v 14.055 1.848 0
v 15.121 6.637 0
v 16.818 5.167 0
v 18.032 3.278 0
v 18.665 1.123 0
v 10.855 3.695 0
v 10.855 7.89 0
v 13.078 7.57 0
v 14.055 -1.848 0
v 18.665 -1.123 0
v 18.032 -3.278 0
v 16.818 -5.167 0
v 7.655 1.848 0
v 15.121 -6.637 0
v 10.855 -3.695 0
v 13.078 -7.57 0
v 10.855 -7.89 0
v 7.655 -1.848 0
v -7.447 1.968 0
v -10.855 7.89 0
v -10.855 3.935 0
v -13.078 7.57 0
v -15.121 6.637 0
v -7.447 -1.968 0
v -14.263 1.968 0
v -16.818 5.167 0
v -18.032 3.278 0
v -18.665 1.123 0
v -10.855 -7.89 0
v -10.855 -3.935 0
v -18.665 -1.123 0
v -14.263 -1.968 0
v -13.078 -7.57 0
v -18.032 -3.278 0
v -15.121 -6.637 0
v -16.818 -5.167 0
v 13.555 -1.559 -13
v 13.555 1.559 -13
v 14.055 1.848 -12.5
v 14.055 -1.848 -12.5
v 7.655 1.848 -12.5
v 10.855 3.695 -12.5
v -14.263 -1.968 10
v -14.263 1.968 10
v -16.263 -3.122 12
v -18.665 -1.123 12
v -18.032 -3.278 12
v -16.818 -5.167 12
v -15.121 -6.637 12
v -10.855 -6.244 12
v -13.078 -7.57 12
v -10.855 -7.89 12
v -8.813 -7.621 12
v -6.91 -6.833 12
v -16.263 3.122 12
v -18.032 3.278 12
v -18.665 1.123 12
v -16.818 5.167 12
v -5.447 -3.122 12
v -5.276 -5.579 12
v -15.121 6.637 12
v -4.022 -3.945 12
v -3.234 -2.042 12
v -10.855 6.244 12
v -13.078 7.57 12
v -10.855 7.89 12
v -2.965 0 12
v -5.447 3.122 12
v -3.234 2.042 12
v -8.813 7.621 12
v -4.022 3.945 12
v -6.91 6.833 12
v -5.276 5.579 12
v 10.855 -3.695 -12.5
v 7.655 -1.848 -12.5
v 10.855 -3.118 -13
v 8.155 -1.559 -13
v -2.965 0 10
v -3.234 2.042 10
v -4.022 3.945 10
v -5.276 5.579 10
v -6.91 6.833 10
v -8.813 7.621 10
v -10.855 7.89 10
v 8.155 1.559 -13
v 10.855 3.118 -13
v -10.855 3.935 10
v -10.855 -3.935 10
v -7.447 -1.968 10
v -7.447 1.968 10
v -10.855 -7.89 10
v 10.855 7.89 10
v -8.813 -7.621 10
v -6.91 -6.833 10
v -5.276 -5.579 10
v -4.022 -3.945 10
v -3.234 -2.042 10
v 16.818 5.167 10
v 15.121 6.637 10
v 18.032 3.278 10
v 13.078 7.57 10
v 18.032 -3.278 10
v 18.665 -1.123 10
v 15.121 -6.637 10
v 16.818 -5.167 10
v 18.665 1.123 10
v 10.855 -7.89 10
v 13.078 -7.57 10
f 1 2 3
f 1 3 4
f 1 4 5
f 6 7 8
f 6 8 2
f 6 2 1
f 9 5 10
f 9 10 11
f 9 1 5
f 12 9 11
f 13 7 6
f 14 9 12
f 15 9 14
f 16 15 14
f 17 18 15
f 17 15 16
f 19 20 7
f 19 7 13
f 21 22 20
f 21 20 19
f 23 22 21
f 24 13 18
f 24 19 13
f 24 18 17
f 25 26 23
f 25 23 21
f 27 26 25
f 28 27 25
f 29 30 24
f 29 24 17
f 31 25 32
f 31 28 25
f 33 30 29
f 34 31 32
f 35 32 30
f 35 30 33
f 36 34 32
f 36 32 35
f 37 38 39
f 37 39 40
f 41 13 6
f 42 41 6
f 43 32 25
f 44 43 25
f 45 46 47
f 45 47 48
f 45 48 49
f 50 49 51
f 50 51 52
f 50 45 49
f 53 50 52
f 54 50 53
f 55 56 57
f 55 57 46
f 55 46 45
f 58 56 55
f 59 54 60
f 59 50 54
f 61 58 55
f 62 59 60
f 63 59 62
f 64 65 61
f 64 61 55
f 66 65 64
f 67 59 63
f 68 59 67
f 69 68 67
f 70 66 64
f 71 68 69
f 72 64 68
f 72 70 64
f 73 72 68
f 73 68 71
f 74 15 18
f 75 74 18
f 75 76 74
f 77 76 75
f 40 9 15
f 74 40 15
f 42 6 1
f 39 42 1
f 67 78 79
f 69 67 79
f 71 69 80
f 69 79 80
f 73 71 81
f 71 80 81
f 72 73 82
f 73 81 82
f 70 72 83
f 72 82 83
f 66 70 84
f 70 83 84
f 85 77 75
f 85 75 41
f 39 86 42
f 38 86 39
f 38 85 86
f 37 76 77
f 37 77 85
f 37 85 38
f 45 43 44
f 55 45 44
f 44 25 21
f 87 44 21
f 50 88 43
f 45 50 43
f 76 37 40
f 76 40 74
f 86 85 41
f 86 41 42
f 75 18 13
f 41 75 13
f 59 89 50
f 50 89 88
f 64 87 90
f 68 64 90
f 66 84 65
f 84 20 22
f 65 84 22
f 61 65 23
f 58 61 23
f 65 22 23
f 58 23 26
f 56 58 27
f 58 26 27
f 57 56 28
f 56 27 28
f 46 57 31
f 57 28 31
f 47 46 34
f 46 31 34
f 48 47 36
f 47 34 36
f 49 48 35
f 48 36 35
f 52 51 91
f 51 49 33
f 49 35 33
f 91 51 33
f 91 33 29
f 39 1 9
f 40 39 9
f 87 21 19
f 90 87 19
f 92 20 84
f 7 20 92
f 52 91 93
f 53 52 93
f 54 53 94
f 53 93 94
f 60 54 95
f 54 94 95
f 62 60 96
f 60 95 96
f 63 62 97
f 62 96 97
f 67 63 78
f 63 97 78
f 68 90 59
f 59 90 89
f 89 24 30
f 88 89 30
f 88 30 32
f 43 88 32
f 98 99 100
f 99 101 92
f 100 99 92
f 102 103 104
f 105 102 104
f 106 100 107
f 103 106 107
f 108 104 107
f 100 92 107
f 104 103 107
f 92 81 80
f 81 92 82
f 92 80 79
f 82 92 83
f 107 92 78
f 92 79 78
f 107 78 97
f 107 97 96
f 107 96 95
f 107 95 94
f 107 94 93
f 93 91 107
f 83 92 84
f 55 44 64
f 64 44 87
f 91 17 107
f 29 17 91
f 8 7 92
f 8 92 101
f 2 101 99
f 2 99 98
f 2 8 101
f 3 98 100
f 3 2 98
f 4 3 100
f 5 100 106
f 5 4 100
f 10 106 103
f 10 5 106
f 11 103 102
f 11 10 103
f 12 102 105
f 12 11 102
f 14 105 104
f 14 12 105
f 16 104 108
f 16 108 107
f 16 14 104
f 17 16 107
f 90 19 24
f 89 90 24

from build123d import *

# Parameters (mm, degrees)
BOSS_EXTRU_1_DEPTH      = 10
BOSS_EXTRU_3_DEPTH      = 13
ENL_V_MAT_EXTRU_1_DEPTH = 31.702233225
BOSS_EXTRU_4_DEPTH      = 2
CHANFREIN1_SIZE         = 2
CHANFREIN2_SIZE         = 0.5


with BuildPart() as part:
    # Esquisse1 → Boss.-Extru.1 (new body)
    with BuildSketch(Plane(origin=(0, 0, 0), x_dir=(0, 1, 0), z_dir=(0, 0, 1))):
        with BuildLine():
            Line((-7.89, -10.855), (-7.89, 10.855))
            ThreePointArc((-7.89, 10.855), (0, 18.745), (7.89, 10.855))
            Line((7.89, 10.855), (7.89, -10.855))
            ThreePointArc((7.89, -10.855), (0, -18.745), (-7.89, -10.855))
        make_face()
    extrude(amount=BOSS_EXTRU_1_DEPTH)

    # Esquisse3 → Boss.-Extru.3 (add)
    with BuildSketch(Plane(origin=(0, 0, 0), x_dir=(1, 0, 0), z_dir=(0, 0, -1))):
        Polygon((10.855, -3.695041723), (14.055, -1.847520861), (14.055, 1.847520861), (10.855, 3.695041723), (7.655, 1.847520861), (7.655, -1.847520861), align=None)
    extrude(amount=BOSS_EXTRU_3_DEPTH)

    # Esquisse2 → Enlèv. mat.-Extru.1 (cut, through all)
    with BuildSketch(Plane.XY.offset(10)):
        Polygon((-10.855, 3.935), (-14.262809964, 1.9675), (-14.262809964, -1.9675), (-10.855, -3.935), (-7.447190036, -1.9675), (-7.447190036, 1.9675), align=None)
    extrude(amount=-ENL_V_MAT_EXTRU_1_DEPTH, mode=Mode.SUBTRACT)

    # Esquisse4 → Boss.-Extru.4 (add)
    with BuildSketch(Plane.XY.offset(10)):
        with BuildLine():
            ThreePointArc((-10.855, -7.89), (-5.275927496, -5.579072504), (-2.965, 0))
            ThreePointArc((-2.965, 0), (-5.275927496, 5.579072504), (-10.855, 7.89))
            ThreePointArc((-10.855, 7.89), (-18.745, 0), (-10.855, -7.89))
        make_face()
        Polygon((-10.855, 3.935), (-7.447190036, 1.9675), (-7.447190036, -1.9675), (-10.855, -3.935), (-14.262809964, -1.9675), (-14.262809964, 1.9675), align=None, mode=Mode.SUBTRACT)
    extrude(amount=BOSS_EXTRU_4_DEPTH)

    # Chanfrein1
    chanfrein1_edges = [part.edges().sort_by_distance(p)[0] for p in [
        (-9.151095018, 2.95125, 12),
        (-7.447190036, 0, 12),
        (-9.151095018, -2.95125, 12),
        (-12.558904982, -2.95125, 12),
        (-14.262809964, 0, 12),
        (-12.558904982, 2.95125, 12),
    ]]
    chamfer(chanfrein1_edges, length=CHANFREIN1_SIZE - 0.0001)  # a hair under: the kernel refuses the full size

    # Chanfrein2
    chanfrein2_edges = [part.edges().sort_by_distance(p)[0] for p in [
        (9.255, 2.771281292, -13),
        (12.455, 2.771281292, -13),
        (14.055, 0, -13),
        (12.455, -2.771281292, -13),
        (9.255, -2.771281292, -13),
        (7.655, 0, -13),
    ]]
    chamfer(chanfrein2_edges, length=CHANFREIN2_SIZE)


solid = part.part
